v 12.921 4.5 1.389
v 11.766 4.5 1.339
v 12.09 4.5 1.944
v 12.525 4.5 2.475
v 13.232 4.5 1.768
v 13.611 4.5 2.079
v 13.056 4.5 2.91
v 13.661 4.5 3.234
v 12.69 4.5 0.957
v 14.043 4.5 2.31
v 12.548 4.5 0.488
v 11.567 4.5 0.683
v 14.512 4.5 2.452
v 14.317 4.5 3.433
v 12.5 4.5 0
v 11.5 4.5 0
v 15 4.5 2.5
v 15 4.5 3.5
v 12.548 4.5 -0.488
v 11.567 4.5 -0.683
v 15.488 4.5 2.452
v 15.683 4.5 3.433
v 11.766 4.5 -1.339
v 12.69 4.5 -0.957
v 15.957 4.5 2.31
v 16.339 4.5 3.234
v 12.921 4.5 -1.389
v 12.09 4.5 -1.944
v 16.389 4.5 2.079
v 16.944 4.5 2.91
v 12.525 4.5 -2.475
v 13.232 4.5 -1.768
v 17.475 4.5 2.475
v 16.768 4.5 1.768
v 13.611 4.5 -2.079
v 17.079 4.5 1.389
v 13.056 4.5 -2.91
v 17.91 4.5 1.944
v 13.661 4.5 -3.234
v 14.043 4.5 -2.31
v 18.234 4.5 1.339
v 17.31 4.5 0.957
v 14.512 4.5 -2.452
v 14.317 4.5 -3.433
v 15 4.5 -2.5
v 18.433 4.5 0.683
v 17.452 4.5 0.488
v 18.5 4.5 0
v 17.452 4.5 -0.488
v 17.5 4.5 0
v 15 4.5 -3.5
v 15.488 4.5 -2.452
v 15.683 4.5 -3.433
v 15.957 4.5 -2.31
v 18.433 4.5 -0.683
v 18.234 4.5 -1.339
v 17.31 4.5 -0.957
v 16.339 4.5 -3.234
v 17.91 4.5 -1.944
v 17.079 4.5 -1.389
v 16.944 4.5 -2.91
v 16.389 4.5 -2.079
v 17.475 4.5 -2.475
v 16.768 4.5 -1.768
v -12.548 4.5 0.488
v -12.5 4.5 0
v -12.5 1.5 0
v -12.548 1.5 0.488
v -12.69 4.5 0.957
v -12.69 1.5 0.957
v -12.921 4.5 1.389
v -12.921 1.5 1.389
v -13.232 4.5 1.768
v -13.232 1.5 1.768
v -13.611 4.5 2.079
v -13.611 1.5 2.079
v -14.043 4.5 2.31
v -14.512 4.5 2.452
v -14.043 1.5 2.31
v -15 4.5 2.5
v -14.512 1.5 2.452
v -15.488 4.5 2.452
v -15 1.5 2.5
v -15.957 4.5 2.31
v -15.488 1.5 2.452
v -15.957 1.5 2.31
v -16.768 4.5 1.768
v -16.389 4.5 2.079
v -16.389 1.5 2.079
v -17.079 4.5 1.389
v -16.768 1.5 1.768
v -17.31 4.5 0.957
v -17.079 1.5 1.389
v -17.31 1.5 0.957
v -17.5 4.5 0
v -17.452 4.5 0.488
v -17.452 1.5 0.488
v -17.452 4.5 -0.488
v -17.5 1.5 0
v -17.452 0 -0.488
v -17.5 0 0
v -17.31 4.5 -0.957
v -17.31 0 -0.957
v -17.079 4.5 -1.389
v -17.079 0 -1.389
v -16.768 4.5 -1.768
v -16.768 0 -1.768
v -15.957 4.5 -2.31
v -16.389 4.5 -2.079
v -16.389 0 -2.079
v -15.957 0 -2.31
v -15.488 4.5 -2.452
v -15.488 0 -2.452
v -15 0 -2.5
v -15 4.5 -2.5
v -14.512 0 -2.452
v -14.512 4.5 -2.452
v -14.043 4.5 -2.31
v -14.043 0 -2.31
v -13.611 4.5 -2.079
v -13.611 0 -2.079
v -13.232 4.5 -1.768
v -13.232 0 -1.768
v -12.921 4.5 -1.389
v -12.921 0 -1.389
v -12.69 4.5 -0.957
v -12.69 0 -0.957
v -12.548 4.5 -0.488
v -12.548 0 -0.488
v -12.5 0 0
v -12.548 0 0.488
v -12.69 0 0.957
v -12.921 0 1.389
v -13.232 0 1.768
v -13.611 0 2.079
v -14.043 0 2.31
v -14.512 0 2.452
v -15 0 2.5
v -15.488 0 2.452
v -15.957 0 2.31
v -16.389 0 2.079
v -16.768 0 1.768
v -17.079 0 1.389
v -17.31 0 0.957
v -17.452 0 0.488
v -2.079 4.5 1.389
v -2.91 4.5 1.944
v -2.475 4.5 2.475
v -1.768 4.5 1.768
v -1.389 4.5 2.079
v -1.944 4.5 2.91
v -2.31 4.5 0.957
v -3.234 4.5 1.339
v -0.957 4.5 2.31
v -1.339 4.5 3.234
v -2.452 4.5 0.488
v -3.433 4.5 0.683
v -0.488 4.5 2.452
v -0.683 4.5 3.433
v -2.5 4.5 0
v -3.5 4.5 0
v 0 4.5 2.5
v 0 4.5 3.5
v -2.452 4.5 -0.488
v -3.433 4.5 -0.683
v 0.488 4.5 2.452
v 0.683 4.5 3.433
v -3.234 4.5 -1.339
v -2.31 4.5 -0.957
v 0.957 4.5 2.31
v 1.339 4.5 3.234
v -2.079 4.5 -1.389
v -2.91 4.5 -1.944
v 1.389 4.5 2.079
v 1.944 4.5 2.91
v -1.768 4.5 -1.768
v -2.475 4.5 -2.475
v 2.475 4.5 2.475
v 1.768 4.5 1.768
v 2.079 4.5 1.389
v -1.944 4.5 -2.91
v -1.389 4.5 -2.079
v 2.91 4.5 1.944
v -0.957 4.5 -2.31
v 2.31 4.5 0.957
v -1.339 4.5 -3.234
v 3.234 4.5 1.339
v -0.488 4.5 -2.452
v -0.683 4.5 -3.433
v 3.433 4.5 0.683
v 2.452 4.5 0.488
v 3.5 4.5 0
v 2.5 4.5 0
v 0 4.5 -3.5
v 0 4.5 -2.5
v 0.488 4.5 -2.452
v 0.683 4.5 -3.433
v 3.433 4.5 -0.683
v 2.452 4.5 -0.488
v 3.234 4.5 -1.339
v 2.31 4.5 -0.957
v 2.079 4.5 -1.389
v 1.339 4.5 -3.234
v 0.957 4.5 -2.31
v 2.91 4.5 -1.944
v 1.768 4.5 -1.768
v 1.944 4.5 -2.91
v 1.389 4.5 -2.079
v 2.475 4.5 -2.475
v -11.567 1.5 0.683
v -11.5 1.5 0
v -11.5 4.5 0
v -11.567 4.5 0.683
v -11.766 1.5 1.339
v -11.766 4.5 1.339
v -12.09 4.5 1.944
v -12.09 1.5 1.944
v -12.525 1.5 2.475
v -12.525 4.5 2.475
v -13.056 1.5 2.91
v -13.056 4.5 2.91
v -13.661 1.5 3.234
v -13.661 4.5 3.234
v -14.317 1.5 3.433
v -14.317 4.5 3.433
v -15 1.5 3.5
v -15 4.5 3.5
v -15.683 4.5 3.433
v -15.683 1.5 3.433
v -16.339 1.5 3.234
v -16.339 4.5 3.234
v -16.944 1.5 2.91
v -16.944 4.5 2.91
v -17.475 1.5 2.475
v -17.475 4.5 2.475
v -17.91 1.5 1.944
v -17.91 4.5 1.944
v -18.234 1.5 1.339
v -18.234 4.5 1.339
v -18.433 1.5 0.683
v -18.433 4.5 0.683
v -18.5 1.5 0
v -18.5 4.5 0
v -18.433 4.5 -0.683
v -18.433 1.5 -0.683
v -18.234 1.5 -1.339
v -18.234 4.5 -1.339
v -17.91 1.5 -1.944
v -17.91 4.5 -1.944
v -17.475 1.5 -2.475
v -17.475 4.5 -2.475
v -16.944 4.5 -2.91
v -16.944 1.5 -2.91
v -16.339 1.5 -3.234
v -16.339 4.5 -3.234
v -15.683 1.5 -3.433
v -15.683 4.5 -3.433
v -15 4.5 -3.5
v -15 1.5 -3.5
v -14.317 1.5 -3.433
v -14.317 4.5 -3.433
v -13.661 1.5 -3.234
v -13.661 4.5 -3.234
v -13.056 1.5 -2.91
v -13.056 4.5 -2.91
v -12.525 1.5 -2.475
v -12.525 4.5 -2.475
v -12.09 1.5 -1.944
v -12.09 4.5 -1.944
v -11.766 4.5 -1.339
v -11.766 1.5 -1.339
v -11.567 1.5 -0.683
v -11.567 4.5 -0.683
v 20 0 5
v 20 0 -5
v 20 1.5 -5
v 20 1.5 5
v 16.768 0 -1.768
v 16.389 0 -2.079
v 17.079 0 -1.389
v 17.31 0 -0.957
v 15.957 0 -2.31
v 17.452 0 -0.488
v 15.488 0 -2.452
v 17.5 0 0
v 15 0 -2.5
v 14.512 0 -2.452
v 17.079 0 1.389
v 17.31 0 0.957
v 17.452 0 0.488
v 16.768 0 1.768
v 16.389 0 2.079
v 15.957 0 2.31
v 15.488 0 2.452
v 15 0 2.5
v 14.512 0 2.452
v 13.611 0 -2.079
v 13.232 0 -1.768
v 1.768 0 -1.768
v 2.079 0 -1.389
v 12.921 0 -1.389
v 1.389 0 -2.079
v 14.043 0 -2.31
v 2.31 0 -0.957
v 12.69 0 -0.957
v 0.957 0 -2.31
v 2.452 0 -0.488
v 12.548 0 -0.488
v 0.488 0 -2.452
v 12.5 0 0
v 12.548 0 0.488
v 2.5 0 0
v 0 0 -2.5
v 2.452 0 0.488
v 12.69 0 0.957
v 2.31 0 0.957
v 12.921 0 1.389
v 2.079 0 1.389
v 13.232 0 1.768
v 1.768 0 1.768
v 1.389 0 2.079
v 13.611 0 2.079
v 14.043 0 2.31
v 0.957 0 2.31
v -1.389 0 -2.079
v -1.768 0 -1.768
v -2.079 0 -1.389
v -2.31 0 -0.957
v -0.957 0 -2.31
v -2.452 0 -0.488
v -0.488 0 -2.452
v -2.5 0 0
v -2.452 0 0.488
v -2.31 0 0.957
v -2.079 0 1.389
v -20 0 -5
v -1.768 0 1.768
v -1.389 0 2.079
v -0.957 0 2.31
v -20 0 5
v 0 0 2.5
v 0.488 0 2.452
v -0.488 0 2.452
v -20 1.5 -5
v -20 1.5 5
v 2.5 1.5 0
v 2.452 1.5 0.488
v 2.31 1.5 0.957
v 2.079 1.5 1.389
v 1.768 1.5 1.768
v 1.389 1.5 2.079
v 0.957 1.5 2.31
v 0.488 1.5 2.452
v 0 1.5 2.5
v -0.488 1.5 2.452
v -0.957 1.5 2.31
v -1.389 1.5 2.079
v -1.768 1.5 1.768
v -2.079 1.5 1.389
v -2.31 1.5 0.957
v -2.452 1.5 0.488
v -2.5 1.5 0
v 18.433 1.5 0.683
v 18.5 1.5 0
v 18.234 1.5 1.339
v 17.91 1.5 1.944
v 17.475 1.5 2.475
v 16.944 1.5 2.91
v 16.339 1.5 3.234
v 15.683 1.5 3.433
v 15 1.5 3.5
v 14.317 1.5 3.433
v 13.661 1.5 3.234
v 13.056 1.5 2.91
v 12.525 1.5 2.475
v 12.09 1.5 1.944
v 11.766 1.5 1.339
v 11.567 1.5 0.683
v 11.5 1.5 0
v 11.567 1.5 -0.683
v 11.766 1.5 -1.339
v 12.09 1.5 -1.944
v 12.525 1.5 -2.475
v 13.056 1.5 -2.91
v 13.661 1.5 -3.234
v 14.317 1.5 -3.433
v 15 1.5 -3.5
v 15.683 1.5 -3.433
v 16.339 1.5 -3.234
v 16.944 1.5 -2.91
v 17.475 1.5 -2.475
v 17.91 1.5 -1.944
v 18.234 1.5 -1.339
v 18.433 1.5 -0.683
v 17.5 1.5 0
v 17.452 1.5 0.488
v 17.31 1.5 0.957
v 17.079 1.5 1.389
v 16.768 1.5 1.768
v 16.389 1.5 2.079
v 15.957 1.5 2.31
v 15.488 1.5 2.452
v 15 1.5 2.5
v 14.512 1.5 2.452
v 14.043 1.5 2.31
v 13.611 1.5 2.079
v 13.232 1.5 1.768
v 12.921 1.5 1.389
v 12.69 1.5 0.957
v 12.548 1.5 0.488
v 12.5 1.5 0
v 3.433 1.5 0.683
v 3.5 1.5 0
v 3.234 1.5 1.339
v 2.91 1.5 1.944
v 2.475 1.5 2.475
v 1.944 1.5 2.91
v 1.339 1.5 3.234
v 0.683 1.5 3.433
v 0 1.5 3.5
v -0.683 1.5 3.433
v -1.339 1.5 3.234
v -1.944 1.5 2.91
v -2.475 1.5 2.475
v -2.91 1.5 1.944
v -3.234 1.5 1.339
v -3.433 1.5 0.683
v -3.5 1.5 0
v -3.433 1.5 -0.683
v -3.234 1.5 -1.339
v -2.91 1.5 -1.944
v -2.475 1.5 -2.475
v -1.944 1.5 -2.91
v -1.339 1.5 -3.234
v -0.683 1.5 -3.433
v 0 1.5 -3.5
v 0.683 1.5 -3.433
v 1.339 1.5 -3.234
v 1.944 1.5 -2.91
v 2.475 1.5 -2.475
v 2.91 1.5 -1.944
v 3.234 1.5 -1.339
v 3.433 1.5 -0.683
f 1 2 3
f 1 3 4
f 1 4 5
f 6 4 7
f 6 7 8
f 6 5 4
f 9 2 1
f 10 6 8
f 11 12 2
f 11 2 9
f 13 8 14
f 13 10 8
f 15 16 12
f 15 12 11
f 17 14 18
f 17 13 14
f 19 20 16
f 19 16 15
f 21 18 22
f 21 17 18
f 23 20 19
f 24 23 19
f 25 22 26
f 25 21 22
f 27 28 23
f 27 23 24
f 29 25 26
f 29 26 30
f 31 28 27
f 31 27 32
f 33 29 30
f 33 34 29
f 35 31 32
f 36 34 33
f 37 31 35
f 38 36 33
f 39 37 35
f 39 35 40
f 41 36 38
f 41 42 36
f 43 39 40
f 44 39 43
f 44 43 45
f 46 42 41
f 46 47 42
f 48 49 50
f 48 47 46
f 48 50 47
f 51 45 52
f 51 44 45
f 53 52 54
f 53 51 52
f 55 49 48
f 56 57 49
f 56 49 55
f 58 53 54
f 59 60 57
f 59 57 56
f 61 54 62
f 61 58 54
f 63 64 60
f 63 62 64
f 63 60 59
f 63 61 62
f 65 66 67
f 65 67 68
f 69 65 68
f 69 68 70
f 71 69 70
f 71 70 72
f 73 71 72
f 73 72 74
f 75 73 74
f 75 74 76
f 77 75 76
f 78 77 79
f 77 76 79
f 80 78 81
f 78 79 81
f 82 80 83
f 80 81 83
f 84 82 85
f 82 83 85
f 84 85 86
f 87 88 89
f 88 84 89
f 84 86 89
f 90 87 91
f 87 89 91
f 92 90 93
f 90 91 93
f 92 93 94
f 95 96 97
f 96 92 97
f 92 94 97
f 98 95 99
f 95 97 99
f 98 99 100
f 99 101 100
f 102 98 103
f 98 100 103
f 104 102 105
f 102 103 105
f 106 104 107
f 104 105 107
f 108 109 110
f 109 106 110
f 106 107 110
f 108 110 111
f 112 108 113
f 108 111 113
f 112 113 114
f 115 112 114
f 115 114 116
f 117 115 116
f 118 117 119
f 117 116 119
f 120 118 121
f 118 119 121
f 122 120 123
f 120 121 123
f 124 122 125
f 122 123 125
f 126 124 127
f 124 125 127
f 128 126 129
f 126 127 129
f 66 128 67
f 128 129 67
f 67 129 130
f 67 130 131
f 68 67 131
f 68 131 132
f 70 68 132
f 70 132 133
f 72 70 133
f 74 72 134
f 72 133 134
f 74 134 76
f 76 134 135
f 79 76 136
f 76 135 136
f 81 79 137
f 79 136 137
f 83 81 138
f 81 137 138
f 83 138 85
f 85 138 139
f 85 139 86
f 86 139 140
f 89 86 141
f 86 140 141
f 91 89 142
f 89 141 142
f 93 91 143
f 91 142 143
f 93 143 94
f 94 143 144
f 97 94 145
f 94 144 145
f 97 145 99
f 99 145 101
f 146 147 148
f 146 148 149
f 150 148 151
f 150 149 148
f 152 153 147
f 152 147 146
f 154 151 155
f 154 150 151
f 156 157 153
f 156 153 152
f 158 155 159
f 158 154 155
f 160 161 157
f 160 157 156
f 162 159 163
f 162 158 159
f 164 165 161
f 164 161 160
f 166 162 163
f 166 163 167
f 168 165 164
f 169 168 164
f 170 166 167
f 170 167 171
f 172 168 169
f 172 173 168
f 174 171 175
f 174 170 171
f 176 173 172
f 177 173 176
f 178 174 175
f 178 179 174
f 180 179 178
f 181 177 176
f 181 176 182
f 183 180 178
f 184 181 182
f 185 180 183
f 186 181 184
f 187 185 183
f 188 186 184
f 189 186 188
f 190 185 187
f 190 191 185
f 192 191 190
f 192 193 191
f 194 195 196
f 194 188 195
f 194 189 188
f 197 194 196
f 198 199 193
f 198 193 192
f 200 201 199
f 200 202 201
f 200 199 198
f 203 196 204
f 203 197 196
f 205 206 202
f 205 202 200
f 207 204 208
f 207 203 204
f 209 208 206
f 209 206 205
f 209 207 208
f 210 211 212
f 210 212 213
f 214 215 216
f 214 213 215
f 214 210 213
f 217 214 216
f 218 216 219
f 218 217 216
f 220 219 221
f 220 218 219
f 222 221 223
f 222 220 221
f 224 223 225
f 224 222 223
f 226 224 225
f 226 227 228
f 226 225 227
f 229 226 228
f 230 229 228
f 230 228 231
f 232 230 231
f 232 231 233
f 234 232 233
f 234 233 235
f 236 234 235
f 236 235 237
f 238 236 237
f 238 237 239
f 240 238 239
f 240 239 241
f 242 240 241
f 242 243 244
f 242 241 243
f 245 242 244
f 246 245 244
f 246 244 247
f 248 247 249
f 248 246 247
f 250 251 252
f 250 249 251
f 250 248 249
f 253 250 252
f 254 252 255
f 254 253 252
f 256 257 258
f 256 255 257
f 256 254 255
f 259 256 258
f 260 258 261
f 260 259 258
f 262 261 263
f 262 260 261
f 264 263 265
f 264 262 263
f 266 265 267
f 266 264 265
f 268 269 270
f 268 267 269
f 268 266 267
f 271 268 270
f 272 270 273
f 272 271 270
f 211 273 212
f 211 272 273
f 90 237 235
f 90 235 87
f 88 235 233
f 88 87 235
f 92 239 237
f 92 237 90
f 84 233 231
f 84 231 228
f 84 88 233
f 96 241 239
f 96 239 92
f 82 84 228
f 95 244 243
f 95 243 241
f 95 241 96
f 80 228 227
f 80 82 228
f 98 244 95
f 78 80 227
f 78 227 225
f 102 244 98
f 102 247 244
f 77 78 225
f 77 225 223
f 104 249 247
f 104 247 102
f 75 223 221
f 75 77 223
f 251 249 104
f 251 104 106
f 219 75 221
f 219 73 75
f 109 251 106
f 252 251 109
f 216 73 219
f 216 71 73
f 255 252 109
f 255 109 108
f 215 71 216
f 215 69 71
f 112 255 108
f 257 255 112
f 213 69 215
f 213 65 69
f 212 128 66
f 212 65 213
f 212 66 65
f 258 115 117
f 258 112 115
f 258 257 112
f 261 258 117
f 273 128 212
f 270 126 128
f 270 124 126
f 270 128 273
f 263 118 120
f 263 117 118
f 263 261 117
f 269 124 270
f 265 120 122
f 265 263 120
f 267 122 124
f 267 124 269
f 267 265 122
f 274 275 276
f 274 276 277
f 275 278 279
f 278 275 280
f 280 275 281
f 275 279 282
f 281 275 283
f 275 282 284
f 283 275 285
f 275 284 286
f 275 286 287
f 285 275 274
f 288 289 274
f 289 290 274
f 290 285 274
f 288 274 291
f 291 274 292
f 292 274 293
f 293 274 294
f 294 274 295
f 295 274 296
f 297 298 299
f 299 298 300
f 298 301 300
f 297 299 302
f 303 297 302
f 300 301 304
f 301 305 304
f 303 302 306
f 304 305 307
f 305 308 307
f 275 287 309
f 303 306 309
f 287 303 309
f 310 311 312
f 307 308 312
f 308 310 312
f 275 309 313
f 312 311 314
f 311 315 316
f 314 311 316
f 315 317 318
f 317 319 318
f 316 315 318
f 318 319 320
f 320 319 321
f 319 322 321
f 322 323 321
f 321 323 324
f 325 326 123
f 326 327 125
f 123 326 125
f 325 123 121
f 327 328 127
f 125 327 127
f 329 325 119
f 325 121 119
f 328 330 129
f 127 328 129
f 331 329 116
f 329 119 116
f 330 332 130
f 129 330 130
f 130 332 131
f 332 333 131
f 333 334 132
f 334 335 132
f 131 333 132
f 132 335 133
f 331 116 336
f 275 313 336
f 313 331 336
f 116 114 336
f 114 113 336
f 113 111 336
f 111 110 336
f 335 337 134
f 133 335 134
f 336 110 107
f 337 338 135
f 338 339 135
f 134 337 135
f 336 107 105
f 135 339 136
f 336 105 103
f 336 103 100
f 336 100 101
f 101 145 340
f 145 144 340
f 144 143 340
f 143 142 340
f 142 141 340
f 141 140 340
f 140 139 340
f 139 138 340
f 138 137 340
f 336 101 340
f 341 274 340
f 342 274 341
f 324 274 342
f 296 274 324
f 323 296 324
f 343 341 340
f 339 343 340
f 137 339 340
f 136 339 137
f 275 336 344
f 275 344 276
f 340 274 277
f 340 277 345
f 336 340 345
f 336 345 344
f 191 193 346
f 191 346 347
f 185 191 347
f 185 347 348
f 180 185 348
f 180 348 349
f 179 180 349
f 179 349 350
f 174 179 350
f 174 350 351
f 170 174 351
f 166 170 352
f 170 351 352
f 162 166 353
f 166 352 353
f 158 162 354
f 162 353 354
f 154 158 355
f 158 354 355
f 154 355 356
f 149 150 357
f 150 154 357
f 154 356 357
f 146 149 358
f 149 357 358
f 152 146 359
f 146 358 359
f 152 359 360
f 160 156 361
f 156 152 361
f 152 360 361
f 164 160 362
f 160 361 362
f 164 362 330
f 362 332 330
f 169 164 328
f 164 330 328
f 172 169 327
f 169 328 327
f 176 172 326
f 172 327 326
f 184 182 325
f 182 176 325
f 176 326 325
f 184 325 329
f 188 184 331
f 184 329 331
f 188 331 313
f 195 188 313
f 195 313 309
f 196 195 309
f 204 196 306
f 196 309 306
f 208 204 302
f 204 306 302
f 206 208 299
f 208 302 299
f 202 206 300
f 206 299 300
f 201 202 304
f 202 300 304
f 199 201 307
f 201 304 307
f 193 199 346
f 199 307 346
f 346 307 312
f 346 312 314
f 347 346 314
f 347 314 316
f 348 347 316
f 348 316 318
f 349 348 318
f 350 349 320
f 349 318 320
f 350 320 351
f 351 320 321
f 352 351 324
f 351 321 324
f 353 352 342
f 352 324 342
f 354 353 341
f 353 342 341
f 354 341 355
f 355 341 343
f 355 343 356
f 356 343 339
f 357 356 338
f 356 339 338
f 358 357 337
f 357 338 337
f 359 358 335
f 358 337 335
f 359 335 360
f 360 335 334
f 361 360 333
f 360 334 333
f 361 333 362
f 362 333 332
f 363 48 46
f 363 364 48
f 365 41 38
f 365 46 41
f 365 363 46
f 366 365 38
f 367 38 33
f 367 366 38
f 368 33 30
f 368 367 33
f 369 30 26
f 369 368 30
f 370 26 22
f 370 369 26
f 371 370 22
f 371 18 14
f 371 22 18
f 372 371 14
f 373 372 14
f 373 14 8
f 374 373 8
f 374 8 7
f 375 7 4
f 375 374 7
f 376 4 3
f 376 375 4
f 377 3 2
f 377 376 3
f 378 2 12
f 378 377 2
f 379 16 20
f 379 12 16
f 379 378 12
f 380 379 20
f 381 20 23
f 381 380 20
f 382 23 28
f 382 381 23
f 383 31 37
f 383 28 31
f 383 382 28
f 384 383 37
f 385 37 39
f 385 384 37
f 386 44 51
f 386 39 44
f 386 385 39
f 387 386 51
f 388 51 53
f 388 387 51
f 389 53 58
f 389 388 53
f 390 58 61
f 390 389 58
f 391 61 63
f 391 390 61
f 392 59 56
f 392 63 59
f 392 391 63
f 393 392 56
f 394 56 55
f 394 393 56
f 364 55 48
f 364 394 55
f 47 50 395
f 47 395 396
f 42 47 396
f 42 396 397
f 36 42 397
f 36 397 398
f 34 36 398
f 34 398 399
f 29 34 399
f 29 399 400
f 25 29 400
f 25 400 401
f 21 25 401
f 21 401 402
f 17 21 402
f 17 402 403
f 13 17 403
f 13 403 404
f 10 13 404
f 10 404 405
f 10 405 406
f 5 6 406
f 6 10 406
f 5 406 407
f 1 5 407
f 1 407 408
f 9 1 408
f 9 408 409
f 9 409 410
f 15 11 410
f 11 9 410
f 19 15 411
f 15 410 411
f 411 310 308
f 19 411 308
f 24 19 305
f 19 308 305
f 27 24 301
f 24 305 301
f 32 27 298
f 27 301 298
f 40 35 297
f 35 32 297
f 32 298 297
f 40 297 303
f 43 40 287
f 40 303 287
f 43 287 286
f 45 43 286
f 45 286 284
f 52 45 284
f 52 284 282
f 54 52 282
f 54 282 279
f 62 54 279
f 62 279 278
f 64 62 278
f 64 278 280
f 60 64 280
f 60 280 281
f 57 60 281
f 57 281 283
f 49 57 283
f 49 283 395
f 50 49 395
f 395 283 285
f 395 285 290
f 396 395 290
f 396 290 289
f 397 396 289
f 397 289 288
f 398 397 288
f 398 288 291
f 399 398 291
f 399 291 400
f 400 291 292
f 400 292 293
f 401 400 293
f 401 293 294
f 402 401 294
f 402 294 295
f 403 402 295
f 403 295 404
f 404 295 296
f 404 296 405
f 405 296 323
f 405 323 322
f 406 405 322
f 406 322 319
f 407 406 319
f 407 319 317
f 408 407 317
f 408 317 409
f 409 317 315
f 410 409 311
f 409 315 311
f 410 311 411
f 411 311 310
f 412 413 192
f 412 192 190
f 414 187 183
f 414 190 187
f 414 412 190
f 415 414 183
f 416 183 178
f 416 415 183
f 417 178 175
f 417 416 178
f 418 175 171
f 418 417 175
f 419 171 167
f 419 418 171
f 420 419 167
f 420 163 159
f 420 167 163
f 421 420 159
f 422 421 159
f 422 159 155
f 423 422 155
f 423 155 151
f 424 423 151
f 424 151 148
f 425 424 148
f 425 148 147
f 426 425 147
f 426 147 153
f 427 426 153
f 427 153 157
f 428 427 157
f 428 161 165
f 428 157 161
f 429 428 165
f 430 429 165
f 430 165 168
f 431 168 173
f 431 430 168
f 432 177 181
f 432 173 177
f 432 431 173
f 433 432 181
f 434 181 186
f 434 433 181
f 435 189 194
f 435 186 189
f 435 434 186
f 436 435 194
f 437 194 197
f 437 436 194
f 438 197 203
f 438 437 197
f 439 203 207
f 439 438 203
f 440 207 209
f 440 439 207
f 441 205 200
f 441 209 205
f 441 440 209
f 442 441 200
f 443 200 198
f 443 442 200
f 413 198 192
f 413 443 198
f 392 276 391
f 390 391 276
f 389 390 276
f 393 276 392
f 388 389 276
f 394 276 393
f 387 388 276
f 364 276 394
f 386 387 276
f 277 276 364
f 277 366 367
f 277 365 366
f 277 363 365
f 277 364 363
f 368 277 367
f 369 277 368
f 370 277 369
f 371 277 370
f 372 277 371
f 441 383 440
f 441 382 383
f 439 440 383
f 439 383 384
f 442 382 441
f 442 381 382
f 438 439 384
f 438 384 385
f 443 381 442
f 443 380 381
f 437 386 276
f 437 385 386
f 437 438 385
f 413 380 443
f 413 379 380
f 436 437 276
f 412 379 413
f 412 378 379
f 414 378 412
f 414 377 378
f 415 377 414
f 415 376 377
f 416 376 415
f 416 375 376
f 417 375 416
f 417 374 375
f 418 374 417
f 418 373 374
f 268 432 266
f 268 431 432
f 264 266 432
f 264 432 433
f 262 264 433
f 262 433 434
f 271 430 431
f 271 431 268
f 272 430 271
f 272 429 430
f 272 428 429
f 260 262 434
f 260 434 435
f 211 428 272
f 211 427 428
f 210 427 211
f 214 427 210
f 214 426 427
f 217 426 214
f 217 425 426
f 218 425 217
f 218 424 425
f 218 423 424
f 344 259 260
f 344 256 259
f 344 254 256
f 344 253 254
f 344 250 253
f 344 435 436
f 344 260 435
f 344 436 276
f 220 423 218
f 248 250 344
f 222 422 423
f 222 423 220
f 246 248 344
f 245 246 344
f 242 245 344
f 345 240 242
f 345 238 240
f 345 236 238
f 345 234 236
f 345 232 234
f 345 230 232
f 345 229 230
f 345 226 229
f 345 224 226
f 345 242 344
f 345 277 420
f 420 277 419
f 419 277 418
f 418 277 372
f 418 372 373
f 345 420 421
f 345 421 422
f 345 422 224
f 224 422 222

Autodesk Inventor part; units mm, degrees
ref_plane "YZ Plane" through (0, 0, 0) normal (1, 0, 0) x (0, 1, 0)
ref_plane "XZ Plane" through (0, 0, 0) normal (0, 1, 0) x (-1, 0, 0)
ref_plane "XY Plane" through (0, 0, 0) normal (0, 0, 1) x (1, 0, 0)
sketch "Sketch1" plane through (0, 0, 0) normal (0, 1, 0) x (-1, 0, 0)
  line L0 (20, -5) -> (-20, -5)
  line L1 (-20, -5) -> (-20, 5)
  line L2 (-20, 5) -> (20, 5)
  line L3 (20, 5) -> (20, -5)
  circle A0 centre (0, 0) radius 2.5
  line L4 (0, 0) -> (15, 0)
  circle A1 centre (15, 0) radius 2.5
  line L5 (0, 0) -> (-15, 0)
  circle A2 centre (-15, 0) radius 2.5
  dimension "d0" = 40
  dimension "d1" = 10
  dimension "d13" = 5
  dimension "d14" = 15
  dimension "d15" = 5
  dimension "d16" = 15
  dimension "d17" = 5
extrude "Extrusion1" add sketch "Sketch1" along normal blind 1.5
sketch "Sketch4" plane through (0, 1.5, 0) normal (0, 1, 0) x (1, 0, 0)
  circle A0 centre (0, 0) radius 3.5
  circle A1 centre (-15, 0) radius 3.5
  circle A2 centre (15, 0) radius 3.5
  circle A3 centre (-15, 0) radius 2.5
  circle A4 centre (0, 0) radius 2.5
  circle A5 centre (15, 0) radius 2.5
  dimension "d18" = 7
  dimension "d21" = 7
  dimension "d22" = 7
  dimension "d23" = 1
  dimension "d24" = 1
  dimension "d25" = 1
extrude "Extrusion3" add sketch "Sketch4" along normal blind 3
properties part number "GANJEL LED PLA"
